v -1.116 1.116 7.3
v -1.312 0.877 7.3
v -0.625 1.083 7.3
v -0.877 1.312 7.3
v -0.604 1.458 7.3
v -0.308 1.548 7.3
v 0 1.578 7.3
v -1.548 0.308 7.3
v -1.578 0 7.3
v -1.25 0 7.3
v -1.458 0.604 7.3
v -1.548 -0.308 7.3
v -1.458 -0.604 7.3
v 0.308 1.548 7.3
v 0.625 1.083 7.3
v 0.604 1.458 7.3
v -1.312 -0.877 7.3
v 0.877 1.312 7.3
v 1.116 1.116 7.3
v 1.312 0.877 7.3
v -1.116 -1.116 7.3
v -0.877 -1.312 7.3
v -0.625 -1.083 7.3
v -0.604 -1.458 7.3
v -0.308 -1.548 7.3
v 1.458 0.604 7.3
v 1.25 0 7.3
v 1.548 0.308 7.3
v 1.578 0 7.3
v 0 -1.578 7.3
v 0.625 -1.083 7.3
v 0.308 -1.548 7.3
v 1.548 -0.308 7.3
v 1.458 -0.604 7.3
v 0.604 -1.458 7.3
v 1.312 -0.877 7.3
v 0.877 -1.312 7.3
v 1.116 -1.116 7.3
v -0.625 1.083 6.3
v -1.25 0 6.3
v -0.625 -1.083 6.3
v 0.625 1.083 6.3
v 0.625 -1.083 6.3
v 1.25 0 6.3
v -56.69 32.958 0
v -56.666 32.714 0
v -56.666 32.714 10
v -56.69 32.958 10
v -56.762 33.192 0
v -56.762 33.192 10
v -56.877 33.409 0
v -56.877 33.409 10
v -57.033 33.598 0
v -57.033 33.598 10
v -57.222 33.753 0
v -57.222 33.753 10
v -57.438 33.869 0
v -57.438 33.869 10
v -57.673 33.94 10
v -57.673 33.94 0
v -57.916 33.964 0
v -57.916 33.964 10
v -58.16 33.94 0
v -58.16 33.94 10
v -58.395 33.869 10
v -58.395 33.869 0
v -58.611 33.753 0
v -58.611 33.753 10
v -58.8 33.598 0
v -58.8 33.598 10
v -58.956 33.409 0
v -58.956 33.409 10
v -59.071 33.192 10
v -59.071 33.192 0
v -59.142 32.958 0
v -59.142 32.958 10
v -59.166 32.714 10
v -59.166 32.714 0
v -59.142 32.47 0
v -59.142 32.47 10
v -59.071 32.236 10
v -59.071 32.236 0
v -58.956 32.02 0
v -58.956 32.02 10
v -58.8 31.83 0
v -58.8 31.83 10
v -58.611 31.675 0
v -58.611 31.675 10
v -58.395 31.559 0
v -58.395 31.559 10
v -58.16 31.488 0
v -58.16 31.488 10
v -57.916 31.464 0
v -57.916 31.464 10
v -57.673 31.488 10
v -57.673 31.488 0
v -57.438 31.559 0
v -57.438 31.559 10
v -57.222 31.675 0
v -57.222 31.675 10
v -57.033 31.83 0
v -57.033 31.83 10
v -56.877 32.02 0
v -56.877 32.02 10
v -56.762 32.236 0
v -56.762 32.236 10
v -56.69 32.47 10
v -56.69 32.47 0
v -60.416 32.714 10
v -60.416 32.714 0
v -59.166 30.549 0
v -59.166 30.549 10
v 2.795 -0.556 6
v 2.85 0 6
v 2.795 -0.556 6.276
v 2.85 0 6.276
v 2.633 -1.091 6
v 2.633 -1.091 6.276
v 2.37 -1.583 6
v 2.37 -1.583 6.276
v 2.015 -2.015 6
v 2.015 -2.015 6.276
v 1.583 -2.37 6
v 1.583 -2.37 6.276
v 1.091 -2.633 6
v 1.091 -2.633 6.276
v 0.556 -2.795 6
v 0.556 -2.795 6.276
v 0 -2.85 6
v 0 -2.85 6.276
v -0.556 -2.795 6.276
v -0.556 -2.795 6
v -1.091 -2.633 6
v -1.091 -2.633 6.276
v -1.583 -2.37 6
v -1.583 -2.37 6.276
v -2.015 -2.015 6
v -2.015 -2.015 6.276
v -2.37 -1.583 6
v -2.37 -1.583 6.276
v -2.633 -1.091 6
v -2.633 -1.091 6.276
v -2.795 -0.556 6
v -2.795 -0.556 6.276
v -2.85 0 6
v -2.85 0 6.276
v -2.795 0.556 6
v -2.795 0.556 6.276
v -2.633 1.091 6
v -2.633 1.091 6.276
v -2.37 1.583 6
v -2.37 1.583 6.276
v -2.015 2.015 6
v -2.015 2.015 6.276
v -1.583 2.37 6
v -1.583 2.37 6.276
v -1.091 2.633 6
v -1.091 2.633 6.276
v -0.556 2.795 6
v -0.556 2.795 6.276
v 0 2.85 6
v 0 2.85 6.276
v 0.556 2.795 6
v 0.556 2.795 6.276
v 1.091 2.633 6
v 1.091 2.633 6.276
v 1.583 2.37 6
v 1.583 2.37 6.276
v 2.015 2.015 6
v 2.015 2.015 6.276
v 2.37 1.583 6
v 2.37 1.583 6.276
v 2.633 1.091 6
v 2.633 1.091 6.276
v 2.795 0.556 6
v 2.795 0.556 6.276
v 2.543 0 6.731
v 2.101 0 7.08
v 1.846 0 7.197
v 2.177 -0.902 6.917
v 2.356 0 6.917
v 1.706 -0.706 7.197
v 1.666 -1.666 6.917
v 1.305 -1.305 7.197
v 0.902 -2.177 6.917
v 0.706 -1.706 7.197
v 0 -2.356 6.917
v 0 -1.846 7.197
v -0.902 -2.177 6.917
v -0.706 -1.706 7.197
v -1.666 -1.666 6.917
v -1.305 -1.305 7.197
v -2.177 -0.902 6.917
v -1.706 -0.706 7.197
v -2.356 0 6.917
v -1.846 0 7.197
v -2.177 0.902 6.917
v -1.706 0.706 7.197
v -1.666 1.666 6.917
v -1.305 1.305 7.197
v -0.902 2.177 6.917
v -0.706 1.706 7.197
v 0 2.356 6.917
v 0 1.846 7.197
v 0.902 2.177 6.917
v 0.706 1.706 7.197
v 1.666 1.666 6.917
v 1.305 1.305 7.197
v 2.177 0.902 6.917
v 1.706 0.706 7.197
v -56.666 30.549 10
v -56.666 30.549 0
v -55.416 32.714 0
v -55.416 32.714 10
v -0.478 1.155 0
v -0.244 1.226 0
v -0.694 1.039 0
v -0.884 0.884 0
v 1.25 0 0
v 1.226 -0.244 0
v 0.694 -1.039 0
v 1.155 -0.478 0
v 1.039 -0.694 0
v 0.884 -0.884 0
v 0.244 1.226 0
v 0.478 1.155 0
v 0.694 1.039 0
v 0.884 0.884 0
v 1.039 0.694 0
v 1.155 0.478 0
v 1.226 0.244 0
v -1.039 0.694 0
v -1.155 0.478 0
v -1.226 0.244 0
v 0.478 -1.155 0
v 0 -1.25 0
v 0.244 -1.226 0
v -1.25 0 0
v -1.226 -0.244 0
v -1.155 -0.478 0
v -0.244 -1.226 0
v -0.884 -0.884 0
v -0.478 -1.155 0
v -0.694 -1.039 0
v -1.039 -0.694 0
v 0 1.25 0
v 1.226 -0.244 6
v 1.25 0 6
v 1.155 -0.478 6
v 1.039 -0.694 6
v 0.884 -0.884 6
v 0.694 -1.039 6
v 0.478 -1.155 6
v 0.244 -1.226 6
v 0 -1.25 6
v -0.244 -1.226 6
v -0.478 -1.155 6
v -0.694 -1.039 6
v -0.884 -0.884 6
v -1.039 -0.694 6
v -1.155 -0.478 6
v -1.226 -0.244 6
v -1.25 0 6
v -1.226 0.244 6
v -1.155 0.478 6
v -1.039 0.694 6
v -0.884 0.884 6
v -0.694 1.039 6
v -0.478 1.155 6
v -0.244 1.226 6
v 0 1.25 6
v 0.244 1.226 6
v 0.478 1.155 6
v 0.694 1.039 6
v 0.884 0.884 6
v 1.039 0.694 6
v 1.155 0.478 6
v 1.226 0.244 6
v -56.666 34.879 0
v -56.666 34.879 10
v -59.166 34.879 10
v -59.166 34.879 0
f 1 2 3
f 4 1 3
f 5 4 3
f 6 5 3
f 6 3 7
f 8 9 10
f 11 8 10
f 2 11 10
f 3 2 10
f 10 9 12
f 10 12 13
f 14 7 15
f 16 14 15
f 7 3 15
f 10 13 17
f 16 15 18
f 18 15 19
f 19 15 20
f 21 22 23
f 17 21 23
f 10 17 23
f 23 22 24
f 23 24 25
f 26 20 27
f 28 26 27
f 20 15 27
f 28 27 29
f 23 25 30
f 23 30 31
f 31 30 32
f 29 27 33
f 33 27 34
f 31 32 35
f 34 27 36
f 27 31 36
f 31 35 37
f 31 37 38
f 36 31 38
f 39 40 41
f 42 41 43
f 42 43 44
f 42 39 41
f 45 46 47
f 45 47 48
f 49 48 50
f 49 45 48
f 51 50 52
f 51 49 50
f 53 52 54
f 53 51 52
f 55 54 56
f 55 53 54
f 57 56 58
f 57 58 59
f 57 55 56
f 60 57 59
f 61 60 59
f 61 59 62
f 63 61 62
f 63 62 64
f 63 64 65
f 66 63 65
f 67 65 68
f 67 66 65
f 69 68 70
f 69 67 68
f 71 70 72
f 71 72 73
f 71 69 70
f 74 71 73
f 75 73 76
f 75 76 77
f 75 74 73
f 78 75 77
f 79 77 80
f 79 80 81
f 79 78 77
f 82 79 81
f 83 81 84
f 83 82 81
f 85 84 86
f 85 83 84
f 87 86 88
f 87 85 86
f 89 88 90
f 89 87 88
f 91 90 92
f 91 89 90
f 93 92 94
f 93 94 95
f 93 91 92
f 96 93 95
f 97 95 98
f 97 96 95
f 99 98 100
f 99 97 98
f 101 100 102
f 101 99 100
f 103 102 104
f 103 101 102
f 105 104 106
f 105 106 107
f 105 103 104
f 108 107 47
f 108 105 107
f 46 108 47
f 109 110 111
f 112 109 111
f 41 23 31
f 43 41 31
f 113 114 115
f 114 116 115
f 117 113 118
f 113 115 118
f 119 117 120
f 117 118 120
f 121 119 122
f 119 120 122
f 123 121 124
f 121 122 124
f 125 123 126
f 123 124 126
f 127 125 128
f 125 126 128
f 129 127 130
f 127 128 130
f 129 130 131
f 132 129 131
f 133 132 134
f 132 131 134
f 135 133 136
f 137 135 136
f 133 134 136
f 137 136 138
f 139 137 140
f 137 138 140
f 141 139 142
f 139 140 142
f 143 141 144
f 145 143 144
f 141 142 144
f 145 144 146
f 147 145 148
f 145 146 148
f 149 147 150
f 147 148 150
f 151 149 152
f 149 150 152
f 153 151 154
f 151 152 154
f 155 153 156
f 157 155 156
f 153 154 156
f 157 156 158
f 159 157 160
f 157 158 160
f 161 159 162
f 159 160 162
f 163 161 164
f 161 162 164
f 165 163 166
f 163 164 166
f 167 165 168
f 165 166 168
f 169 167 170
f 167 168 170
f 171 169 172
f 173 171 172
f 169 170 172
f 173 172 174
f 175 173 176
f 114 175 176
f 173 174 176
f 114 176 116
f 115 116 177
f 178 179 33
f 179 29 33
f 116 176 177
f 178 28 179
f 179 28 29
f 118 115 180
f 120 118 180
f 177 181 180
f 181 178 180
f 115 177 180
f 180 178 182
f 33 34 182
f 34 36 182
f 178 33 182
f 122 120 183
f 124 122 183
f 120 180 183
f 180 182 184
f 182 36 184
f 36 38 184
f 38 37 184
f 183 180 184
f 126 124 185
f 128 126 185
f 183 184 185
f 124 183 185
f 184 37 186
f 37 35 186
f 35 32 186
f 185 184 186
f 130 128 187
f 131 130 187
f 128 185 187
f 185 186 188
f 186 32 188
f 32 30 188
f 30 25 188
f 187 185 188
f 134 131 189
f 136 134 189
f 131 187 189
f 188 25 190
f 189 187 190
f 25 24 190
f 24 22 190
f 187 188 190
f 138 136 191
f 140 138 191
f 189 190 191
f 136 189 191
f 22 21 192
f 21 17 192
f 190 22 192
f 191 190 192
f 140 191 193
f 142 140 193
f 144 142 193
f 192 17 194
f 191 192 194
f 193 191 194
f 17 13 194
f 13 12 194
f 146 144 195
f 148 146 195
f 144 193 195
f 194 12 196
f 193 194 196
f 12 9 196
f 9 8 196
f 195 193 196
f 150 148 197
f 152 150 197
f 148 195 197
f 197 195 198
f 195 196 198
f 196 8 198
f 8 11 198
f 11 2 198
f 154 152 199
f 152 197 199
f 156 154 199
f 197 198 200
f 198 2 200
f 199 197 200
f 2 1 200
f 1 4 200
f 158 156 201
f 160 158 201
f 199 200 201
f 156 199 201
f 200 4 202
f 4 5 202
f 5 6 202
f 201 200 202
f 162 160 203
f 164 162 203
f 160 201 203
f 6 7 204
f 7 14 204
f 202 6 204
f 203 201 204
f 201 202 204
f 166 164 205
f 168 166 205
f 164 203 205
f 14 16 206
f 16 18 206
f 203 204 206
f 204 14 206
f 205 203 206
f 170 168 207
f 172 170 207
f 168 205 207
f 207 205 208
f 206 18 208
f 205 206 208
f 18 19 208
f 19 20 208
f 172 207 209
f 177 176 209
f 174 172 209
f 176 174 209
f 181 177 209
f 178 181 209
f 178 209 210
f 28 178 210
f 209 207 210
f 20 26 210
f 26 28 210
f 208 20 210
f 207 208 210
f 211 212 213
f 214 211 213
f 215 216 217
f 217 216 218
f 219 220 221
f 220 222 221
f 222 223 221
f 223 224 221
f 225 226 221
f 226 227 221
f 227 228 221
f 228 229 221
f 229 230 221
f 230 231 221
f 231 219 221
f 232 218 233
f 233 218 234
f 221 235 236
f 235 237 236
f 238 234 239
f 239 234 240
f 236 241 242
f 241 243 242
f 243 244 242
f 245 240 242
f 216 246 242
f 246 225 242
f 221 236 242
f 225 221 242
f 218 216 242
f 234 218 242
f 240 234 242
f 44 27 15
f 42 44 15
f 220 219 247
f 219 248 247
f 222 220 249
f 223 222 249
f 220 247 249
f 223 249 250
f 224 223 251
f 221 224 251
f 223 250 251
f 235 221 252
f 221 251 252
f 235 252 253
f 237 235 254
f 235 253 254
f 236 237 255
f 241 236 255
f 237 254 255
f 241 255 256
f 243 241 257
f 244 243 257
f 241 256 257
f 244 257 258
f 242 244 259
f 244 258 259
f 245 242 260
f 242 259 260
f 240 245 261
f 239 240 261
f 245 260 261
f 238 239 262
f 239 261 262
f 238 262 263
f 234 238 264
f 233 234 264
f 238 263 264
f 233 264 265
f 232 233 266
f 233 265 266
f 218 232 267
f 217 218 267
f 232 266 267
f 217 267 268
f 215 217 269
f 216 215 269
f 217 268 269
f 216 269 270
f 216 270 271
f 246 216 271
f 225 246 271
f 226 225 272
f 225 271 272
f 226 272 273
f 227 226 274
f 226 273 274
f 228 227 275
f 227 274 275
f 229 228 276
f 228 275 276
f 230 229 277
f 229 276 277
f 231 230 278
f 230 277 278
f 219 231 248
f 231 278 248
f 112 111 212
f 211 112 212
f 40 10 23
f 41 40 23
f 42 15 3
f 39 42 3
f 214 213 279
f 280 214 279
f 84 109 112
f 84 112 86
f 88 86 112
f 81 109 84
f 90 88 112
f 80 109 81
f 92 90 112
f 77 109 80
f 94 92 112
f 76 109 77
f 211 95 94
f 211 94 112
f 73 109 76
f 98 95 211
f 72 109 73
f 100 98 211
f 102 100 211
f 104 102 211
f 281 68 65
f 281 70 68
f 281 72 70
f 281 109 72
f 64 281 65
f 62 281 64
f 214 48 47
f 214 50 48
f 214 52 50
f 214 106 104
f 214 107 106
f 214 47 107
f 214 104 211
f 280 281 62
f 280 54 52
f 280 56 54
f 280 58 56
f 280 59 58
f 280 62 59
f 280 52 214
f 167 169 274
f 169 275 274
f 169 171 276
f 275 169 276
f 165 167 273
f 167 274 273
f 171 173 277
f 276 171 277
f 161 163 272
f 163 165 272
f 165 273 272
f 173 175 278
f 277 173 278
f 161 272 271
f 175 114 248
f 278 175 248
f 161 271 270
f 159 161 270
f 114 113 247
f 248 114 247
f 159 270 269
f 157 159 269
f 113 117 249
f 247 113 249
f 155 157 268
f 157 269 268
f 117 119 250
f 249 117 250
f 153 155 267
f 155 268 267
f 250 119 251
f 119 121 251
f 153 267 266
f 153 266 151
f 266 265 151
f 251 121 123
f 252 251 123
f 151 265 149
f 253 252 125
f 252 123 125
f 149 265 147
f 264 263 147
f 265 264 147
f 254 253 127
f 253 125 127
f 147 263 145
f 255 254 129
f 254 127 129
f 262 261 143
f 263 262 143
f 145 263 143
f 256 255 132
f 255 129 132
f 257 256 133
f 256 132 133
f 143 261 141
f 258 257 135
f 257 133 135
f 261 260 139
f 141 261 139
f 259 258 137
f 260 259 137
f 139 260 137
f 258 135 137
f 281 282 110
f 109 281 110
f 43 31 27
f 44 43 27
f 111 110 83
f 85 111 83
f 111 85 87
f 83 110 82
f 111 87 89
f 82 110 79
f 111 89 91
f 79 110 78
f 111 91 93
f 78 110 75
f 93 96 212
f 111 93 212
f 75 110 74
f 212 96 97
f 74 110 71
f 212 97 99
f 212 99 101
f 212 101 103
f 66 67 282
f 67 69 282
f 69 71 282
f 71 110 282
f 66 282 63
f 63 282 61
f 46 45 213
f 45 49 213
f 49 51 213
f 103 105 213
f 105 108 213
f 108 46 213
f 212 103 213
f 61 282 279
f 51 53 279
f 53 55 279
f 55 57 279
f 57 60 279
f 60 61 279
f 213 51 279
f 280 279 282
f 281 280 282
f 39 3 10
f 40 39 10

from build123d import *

# Parameters (mm, degrees)
F0_W     = 1.25
F0_H     = 6
F3_DEPTH = 1
F4_R     = 1.25
F5_DEPTH = 10


with BuildPart() as f1:
    # F0 (on Front) → F1 (revolve)
    with BuildSketch(Plane.XZ):
        with Locations((0.625, 3)):
            Rectangle(F0_W, F0_H)
        with BuildLine():
            Line((0, 7.3), (0, 6))
            Line((0, 6), (1.25, 6))
            Line((1.25, 6), (2.85, 6))
            Line((2.85, 6), (2.85, 6.276))
            add(Edge.make_bspline(
                [(2.85, 6.276), (2.7105947611, 6.5077565069), (2.424505943, 6.9833695162), (1.8649721857, 7.1926814812), (1.578087802, 7.3)],
                knots=[0, 0, 0, 0, 0.4872795789, 1, 1, 1, 1], degree=3))
            Line((1.578087802, 7.3), (0, 7.3))
        make_face()
    revolve(axis=Axis((0, 0, 3), (0, 0, -1)))

    # F2 (on face) → F3 (cut)
    with BuildSketch(Plane.XY.offset(7.3)):
        Polygon((-1.25, 0), (1.25, 0), (0.625, 1.0825317547), (-0.625, 1.0825317547), align=None)
        Polygon((0.625, -1.0825317547), (1.25, 0), (-1.25, 0), (-0.625, -1.0825317547), align=None)
    extrude(amount=-F3_DEPTH, mode=Mode.SUBTRACT)


with BuildPart() as f5:
    # F4 (on Top) → F5 (new body)
    with BuildSketch(Plane.XY):
        Polygon((-56.666437649, 30.5490305749), (-55.416437649, 32.7140940844), (-56.666437649, 34.8791575939), (-59.166437649, 34.8791575939), (-60.416437649, 32.7140940844), (-59.166437649, 30.5490305749), align=None)
        with Locations((-57.916437649, 32.7140940844)):
            Circle(F4_R, mode=Mode.SUBTRACT)
    extrude(amount=F5_DEPTH)


solid = Compound([f1.part, f5.part])
